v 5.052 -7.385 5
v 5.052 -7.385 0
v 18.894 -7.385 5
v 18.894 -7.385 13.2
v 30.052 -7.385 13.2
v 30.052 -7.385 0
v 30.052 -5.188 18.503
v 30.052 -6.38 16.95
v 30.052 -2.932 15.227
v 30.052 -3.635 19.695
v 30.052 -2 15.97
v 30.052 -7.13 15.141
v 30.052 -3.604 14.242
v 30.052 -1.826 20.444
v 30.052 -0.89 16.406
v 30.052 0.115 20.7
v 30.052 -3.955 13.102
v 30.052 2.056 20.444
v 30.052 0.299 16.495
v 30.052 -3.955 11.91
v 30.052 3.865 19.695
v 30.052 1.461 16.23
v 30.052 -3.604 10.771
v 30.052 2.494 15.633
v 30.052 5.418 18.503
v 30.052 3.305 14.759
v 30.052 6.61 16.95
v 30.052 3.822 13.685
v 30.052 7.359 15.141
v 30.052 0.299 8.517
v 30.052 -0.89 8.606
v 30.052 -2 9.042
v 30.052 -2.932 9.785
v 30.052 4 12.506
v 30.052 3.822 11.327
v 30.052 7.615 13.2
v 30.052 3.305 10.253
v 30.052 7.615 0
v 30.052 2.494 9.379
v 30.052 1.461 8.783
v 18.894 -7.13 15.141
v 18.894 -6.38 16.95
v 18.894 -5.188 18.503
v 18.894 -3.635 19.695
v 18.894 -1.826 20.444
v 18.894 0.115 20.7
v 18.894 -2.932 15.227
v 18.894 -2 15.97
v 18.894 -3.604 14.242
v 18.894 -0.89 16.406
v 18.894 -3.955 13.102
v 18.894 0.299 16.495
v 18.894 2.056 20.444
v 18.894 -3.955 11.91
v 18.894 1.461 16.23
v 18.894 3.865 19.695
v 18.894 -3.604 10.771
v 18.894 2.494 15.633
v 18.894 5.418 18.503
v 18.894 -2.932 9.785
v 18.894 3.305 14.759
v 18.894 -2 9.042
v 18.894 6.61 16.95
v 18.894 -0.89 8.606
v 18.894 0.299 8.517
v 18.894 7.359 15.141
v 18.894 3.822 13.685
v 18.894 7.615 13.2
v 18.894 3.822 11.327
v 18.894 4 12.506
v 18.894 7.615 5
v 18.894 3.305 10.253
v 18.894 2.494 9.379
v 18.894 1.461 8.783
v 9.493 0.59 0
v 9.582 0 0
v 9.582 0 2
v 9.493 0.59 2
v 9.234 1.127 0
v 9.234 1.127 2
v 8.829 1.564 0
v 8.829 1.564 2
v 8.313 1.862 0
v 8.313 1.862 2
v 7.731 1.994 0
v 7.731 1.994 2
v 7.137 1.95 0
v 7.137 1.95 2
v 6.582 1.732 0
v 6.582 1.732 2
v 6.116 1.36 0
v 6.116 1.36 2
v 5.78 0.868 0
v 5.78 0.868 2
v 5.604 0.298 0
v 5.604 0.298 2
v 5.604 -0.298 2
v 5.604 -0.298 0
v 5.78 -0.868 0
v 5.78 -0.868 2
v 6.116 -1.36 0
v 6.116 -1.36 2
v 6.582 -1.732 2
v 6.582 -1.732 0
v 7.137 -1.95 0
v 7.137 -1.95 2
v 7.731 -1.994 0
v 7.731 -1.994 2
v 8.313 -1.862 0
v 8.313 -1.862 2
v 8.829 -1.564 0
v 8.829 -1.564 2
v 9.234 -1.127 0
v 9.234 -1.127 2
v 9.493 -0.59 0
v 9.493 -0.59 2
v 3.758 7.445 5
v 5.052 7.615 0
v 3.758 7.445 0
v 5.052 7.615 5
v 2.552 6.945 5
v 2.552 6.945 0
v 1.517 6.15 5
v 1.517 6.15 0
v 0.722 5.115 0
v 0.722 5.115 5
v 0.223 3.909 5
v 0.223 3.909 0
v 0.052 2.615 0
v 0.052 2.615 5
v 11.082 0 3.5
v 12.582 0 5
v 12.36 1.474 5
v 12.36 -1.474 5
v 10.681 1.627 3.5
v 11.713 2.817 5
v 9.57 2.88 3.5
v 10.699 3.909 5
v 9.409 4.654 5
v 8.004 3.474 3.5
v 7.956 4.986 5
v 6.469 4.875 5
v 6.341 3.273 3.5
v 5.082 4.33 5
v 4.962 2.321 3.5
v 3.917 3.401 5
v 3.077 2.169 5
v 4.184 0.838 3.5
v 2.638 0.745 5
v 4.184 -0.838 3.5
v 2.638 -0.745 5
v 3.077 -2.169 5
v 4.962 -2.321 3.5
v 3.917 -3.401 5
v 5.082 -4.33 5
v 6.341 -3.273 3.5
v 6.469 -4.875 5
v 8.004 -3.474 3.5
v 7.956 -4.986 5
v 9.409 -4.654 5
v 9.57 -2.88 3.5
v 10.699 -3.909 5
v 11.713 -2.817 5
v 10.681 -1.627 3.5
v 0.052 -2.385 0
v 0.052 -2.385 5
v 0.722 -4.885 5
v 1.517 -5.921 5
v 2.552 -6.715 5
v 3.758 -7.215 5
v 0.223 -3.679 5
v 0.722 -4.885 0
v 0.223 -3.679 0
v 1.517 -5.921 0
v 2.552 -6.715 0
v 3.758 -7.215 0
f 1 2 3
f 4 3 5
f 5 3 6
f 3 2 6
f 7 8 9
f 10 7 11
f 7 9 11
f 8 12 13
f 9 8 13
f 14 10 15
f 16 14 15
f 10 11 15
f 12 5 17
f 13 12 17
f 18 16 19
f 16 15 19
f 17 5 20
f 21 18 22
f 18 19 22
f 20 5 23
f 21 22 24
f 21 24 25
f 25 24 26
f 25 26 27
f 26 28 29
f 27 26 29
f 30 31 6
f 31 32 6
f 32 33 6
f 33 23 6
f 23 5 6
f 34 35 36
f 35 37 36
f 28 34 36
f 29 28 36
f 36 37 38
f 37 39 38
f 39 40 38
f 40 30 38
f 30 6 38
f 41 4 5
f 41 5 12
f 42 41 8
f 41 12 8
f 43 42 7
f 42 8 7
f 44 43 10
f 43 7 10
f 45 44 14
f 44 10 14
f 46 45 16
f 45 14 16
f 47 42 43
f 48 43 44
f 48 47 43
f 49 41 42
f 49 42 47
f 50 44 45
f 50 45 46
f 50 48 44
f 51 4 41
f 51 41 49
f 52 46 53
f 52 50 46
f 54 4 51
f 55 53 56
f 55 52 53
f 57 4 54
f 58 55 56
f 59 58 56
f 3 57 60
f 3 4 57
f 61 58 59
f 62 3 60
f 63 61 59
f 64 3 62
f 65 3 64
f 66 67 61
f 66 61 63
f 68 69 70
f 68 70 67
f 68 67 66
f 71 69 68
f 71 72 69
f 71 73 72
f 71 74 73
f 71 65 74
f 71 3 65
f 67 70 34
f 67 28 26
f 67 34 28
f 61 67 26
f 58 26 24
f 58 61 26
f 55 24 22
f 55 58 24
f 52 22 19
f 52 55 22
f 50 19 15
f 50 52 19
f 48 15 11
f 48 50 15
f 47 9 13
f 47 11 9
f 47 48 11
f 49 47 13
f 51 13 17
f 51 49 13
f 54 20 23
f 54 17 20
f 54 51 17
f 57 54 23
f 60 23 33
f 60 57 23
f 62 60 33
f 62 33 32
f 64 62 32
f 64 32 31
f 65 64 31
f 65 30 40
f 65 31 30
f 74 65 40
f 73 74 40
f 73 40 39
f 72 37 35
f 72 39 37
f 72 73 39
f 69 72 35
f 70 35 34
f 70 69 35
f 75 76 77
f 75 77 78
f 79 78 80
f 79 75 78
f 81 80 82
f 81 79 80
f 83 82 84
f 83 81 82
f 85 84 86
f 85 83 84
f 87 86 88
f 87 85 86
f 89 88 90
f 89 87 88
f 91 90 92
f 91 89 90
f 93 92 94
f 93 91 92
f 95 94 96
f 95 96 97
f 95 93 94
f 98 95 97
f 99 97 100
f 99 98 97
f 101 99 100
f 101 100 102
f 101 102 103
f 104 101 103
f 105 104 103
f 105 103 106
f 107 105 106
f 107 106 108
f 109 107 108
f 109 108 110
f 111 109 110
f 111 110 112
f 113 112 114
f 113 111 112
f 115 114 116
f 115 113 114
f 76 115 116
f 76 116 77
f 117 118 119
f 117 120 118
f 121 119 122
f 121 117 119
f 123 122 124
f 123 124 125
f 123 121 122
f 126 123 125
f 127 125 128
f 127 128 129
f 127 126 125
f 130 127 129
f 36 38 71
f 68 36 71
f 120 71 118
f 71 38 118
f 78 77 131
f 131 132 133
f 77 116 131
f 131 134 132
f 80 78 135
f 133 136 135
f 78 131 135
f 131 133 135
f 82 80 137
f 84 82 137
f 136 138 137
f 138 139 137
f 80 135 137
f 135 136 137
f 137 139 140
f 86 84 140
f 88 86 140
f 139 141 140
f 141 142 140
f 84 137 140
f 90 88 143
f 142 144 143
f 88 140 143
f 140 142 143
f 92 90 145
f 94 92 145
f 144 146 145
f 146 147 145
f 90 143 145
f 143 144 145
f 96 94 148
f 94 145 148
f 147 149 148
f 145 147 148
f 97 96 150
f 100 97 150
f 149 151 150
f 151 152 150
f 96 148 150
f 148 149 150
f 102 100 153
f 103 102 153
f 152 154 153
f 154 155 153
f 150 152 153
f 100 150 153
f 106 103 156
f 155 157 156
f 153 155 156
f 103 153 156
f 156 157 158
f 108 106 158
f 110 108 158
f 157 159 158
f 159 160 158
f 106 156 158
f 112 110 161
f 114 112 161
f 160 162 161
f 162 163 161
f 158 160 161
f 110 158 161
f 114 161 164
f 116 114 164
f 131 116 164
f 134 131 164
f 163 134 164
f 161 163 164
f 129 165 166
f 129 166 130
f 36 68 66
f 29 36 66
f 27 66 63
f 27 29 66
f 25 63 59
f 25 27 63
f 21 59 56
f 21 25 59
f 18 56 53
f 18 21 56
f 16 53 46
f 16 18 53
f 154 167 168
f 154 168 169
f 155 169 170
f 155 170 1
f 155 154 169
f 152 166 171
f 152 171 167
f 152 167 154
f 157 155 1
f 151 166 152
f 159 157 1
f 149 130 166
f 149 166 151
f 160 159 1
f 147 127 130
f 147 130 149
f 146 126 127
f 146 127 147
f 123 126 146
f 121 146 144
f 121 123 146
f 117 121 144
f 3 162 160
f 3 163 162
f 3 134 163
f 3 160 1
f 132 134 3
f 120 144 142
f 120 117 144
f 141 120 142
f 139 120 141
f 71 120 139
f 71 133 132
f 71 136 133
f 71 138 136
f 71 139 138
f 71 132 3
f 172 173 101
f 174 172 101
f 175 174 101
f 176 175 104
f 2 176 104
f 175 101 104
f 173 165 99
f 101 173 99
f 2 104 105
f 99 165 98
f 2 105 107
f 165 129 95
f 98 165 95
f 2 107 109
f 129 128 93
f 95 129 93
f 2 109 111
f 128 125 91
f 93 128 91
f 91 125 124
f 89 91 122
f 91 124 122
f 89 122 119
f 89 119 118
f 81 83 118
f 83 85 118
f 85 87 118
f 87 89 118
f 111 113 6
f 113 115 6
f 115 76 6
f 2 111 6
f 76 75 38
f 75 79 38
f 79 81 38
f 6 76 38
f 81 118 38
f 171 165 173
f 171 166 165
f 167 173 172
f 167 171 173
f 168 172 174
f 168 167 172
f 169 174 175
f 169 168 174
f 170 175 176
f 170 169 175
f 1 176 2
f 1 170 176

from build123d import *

# Parameters (mm, degrees)
F0_W     = 18.8419777411
F0_H     = 15
F0_R     = 2
F0_W_2   = 11.1580222589
F1_DEPTH = 5
F2_SIZE  = 3
F3_DEPTH = 20.7
F4_R     = 4
F5_DEPTH = 55.3
F6_R     = 7.49999
F7_R     = 5


# Not quite as in the source:
# - a fillet or chamfer is up to 0.001 mm smaller than in the source, because OpenCascade refuses the exact size


with BuildPart() as f1:
    # F0 (on Top) → F1 (new body)
    with BuildSketch(Plane.XY):
        with Locations((9.4734227529, 0.1149109378)):
            Rectangle(F0_W, F0_H)
        with Locations((7.5819236226, 0)):
            Circle(F0_R, mode=Mode.SUBTRACT)
        with Locations((24.4734227529, 0.1149109378)):
            Rectangle(F0_W_2, F0_H)
    extrude(amount=F1_DEPTH)

    # F2
    f2_edges = [f1.edges().sort_by_distance(p)[0] for p in [
        (5.581924, 0, 5),
    ]]
    chamfer(f2_edges, length=F2_SIZE)

    # F0 (on Top) → F3 (join)
    with BuildSketch(Plane.XY):
        with Locations((24.4734227529, 0.1149109378)):
            Rectangle(F0_W_2, F0_H)
    extrude(amount=F3_DEPTH)

    # F4 (on Right) → F5 (cut)
    with BuildSketch(Plane.YZ):
        with Locations((0, 12.5060472637)):
            Circle(F4_R)
    extrude(amount=F5_DEPTH, mode=Mode.SUBTRACT)

    # F6 (radius 7.5 in the source; OpenCascade refuses exactly that, so slightly less here)
    f6_edges = [f1.edges().sort_by_distance(p)[0] for p in [
        (24.473423, -7.385089, 20.7),
        (24.473423, 7.614911, 20.7),
    ]]
    fillet(f6_edges, radius=F6_R)

    # F7
    f7_edges = [f1.edges().sort_by_distance(p)[0] for p in [
        (0.052434, -7.385089, 2.5),
        (0.052434, 7.614911, 2.5),
    ]]
    fillet(f7_edges, radius=F7_R)


solid = f1.part
